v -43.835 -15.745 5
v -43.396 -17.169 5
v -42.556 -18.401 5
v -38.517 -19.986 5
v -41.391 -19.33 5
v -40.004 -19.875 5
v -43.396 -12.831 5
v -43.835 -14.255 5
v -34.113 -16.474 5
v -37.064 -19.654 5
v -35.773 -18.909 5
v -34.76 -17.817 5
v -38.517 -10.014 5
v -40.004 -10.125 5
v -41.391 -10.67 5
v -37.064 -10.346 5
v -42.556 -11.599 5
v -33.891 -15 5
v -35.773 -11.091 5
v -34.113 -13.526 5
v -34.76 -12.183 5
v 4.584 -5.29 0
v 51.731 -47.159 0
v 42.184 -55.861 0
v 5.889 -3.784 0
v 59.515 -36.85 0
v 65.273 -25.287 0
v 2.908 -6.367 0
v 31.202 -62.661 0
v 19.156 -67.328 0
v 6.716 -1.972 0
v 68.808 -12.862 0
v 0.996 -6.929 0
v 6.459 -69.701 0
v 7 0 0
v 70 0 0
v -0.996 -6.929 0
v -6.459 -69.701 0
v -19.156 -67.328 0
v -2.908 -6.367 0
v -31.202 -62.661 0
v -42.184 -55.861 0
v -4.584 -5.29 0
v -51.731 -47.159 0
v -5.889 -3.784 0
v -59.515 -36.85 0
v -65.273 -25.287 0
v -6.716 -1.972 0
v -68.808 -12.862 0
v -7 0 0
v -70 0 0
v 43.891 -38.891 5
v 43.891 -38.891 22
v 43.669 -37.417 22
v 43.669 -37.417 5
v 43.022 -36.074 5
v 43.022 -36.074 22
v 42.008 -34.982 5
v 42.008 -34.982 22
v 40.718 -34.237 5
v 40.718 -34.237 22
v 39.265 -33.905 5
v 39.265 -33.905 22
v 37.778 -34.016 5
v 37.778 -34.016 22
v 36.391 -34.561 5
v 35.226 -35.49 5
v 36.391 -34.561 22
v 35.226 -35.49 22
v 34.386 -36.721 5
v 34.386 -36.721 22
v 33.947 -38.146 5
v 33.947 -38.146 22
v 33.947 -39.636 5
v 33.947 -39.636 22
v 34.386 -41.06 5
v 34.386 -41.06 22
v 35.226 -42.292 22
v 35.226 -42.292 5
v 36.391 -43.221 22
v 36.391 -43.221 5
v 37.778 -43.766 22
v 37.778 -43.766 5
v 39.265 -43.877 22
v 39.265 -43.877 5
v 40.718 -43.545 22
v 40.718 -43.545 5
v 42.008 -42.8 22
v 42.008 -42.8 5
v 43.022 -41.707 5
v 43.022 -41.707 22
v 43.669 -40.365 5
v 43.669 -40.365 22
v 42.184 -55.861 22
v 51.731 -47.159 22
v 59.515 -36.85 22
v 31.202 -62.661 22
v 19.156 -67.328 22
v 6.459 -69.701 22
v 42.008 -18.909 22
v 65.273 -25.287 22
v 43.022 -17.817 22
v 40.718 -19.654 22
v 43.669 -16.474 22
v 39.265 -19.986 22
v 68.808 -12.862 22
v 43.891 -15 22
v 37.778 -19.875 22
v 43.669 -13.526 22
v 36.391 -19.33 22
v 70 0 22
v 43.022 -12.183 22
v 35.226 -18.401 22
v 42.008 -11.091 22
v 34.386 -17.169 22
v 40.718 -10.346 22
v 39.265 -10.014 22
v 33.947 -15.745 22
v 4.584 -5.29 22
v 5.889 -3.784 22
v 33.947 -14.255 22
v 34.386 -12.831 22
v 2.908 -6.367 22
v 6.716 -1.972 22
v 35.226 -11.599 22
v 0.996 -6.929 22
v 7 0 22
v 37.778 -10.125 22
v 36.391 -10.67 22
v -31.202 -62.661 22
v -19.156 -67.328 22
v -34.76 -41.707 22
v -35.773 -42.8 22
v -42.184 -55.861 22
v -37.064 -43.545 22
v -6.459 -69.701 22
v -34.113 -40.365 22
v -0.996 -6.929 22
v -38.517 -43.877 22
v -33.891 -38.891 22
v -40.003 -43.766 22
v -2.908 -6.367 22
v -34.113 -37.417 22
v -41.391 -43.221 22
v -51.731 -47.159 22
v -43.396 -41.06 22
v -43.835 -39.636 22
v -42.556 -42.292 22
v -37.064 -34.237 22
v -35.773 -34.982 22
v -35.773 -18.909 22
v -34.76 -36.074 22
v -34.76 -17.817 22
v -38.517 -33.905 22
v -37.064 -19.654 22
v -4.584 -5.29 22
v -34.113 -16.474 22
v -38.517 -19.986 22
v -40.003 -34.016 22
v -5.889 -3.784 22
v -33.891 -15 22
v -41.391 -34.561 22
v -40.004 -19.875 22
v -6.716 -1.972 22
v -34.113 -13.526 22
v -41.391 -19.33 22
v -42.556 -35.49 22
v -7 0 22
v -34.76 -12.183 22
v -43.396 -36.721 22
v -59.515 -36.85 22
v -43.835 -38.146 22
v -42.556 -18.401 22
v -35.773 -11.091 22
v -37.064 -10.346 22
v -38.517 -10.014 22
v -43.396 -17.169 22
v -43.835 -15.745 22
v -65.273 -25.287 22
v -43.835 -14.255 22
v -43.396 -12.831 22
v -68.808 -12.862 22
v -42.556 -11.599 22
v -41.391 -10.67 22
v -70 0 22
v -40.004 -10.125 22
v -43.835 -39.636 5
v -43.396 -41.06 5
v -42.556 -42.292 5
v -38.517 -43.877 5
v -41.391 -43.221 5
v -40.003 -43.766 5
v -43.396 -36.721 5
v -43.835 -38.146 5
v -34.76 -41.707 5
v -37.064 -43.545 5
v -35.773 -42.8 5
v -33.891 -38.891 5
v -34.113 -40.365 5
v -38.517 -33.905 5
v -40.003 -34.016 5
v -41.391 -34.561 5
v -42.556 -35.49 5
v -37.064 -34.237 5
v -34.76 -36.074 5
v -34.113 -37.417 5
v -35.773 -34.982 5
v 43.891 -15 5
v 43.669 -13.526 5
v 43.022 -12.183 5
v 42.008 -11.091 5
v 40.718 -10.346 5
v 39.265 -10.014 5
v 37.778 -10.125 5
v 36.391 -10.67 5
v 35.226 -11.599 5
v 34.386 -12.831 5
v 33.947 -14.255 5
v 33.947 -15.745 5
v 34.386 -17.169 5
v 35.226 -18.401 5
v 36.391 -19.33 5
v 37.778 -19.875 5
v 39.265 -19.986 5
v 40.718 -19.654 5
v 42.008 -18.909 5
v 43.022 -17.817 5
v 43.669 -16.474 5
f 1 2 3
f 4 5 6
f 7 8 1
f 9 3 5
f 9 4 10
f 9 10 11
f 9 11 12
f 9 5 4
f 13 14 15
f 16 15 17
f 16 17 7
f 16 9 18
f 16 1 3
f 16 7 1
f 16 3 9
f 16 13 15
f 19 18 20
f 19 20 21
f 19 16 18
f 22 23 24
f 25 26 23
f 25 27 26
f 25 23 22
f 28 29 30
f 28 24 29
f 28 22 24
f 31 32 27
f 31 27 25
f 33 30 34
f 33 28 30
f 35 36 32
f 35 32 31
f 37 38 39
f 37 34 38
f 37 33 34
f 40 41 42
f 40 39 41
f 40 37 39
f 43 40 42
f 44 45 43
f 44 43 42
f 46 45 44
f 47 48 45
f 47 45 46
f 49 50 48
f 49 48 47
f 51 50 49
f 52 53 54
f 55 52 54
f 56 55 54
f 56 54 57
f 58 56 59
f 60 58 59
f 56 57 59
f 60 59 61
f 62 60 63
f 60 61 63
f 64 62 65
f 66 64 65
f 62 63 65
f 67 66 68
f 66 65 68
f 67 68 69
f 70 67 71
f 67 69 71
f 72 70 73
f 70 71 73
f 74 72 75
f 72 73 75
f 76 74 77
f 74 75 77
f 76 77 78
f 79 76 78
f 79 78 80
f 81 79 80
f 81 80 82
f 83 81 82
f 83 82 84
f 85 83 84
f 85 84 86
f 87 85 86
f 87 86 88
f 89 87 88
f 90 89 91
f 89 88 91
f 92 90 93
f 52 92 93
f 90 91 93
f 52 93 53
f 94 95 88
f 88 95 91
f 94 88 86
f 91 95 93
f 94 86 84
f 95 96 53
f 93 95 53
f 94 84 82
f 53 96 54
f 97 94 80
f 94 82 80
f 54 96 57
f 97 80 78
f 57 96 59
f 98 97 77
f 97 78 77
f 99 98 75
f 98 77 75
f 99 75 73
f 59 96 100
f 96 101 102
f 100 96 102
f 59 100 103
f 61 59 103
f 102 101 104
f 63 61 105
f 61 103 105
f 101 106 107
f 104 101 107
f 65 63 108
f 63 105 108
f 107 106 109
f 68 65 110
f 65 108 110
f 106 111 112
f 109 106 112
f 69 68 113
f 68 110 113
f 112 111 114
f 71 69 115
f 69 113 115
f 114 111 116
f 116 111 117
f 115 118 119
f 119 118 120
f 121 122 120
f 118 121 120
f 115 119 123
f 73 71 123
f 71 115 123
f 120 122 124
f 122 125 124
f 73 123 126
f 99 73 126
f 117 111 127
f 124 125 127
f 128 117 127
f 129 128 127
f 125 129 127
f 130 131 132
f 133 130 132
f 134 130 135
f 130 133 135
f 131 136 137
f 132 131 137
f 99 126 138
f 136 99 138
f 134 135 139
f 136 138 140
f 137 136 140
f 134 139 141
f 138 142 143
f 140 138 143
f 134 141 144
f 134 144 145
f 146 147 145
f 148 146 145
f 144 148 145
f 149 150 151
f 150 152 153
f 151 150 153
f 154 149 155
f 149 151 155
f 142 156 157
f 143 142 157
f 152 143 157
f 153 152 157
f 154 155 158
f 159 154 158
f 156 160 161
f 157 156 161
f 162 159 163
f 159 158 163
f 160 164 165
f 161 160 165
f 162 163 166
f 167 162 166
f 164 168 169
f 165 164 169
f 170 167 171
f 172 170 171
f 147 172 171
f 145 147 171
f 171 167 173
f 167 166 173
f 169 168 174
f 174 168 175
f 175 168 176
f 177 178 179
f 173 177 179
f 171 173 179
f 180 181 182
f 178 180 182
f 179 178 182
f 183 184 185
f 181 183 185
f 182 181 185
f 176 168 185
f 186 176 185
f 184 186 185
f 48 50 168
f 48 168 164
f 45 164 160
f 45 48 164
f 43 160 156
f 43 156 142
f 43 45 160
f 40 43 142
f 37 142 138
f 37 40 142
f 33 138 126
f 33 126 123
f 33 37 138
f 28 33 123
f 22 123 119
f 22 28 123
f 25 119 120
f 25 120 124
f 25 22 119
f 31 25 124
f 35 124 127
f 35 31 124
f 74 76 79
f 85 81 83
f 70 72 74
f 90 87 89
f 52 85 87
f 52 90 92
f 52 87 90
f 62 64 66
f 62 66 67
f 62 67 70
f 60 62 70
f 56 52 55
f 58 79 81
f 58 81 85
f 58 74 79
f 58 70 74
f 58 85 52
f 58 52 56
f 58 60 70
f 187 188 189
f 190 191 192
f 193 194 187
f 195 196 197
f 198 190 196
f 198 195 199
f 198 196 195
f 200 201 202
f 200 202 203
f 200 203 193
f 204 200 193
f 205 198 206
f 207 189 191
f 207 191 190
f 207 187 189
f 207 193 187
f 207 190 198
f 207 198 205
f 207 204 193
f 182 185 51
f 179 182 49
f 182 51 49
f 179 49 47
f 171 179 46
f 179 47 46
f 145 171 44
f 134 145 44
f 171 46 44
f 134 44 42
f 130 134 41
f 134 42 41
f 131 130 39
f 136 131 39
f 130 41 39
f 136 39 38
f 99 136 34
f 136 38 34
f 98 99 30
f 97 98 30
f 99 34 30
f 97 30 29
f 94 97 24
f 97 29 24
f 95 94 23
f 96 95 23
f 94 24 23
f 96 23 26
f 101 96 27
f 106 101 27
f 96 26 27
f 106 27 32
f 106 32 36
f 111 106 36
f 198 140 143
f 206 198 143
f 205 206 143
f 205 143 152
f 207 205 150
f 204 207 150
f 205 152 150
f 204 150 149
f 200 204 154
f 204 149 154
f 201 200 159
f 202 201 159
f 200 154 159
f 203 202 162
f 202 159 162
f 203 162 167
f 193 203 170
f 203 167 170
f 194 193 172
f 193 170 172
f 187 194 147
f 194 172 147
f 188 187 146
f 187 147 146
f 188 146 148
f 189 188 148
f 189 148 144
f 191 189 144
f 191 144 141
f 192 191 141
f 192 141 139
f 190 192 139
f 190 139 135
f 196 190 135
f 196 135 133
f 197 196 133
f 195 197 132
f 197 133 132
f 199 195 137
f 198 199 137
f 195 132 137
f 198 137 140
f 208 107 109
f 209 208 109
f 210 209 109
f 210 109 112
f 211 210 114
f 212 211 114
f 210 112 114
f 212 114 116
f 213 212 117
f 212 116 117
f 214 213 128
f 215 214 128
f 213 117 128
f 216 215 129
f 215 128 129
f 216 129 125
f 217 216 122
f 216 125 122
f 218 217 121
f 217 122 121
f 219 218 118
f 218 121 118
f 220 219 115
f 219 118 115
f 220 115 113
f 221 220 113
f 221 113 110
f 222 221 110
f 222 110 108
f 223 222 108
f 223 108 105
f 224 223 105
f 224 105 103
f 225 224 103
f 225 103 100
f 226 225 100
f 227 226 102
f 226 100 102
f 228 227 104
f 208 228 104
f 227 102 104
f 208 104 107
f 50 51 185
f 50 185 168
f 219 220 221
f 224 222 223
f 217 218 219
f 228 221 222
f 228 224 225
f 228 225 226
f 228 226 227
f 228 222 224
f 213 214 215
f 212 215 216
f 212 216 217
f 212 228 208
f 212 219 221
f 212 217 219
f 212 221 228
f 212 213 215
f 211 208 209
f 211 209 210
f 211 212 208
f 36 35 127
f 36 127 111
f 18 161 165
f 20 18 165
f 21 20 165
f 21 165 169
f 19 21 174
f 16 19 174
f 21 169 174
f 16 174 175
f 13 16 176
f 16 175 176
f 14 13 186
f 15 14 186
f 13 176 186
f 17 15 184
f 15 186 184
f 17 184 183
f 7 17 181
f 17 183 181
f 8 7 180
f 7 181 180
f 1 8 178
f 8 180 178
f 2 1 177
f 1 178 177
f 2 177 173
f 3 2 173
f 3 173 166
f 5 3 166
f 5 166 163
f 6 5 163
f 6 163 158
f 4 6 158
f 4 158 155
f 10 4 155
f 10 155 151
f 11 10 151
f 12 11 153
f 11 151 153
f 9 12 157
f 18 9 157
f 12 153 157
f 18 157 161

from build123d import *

# Parameters (mm, degrees)
PAD_DEPTH    = 22
SKETCH001_R  = 5
PAD001_DEPTH = 17
POCKET_DEPTH = 17


with BuildPart() as part:
    # Sketch → Pad (new body)
    with BuildSketch(Plane.XY):
        with BuildLine():
            ThreePointArc((-7, 0), (0, -7), (7, 0))
            Line((7, 0), (70, 0))
            ThreePointArc((-70, 0), (0, -70), (70, 0))
            Line((-70, 0), (-7, 0))
        make_face()
    extrude(amount=PAD_DEPTH)

    # Sketch001 (on Face6 of Pad) → Pad001 (join)
    with BuildSketch(Plane.XY.offset(22)):
        with Locations((-38.890873, -38.890873)):
            Circle(SKETCH001_R)
        with Locations((38.890873, -38.890873)):
            Circle(SKETCH001_R)
        with Locations((-38.8909, -15)):
            Circle(SKETCH001_R)
        with Locations((38.8909, -15)):
            Circle(SKETCH001_R)
    extrude(amount=-PAD001_DEPTH)

    # Sketch001 (on Face6 of Pad) → Pocket (cut)
    with BuildSketch(Plane.XY.offset(22)):
        with Locations((-38.890873, -38.890873)):
            Circle(SKETCH001_R)
        with Locations((38.890873, -38.890873)):
            Circle(SKETCH001_R)
        with Locations((-38.8909, -15)):
            Circle(SKETCH001_R)
        with Locations((38.8909, -15)):
            Circle(SKETCH001_R)
    extrude(amount=-POCKET_DEPTH, mode=Mode.SUBTRACT)


solid = part.part
